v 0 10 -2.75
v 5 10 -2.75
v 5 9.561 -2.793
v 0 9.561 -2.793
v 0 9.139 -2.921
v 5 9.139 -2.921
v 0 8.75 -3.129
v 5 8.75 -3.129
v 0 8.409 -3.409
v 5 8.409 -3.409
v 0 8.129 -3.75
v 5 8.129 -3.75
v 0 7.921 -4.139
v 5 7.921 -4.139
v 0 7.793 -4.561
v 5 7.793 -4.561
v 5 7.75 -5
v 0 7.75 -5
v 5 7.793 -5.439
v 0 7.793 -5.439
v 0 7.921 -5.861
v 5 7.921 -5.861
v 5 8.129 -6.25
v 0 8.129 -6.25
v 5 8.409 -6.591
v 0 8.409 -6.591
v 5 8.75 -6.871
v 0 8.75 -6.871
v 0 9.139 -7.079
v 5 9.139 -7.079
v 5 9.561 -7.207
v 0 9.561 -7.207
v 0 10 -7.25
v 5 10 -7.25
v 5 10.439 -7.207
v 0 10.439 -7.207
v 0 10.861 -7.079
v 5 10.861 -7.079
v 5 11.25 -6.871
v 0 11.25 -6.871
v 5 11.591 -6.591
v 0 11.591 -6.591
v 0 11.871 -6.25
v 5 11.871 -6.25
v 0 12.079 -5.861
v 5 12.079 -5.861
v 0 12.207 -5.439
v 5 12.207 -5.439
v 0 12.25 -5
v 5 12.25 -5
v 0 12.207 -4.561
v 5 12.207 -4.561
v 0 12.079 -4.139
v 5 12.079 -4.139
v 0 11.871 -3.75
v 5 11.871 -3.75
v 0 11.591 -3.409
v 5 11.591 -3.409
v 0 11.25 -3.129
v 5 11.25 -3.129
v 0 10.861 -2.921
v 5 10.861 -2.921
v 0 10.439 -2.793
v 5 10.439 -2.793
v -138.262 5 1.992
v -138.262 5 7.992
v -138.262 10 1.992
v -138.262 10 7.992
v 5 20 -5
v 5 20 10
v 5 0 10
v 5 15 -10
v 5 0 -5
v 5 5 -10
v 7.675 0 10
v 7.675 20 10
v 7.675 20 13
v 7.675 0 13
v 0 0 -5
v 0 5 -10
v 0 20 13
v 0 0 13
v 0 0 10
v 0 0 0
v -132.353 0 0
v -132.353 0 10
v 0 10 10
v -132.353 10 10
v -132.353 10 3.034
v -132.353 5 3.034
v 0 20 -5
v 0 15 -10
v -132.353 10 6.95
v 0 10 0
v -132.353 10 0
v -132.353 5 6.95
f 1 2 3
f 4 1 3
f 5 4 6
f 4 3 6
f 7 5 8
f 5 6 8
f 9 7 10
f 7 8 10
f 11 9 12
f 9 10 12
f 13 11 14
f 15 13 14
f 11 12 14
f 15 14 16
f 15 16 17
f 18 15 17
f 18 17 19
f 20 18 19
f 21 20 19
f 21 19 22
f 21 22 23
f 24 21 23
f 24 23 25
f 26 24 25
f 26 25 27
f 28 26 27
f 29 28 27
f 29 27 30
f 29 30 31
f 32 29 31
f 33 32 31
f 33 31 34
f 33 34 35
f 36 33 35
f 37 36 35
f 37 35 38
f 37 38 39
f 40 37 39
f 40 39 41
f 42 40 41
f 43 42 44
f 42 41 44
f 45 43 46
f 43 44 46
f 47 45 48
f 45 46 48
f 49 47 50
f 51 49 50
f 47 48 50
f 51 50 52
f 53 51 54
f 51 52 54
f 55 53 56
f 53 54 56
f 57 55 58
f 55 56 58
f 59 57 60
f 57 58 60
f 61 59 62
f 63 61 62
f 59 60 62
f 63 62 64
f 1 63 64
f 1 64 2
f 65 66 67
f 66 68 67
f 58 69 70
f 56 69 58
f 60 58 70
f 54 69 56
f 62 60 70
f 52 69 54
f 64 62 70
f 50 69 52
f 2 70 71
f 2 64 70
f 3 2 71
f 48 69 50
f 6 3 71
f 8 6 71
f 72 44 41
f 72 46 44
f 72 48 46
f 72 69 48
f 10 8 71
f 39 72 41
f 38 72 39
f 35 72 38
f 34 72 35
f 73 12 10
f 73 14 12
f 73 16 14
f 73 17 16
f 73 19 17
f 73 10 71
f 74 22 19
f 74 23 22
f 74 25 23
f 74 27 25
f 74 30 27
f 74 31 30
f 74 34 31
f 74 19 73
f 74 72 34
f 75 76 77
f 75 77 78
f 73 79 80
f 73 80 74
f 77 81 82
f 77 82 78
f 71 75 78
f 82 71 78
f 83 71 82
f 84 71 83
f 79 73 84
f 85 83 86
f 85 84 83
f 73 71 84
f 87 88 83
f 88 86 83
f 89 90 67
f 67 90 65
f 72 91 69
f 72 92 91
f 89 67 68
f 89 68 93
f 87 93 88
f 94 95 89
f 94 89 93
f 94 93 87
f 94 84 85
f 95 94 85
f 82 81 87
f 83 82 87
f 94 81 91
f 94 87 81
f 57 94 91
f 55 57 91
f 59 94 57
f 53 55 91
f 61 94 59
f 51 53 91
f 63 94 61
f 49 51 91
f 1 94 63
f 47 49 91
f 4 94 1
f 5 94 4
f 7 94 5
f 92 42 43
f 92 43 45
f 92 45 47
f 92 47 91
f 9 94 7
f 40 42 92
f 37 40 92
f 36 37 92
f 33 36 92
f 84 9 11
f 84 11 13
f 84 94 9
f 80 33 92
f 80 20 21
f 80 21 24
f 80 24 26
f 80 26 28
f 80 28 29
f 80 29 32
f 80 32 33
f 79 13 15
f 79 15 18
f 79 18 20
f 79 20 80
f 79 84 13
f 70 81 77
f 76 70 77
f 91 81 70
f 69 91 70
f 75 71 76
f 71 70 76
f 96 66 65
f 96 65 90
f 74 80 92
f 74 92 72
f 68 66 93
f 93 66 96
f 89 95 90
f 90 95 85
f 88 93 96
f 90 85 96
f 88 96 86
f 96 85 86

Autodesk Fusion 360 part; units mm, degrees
sketch "Sketch1" plane through (0, 0, 0) normal (0, 1, 0) x (1, 0, 0)
  line L0 (0, 0) -> (-25, 0)
  line L1 (-25, 0) -> (-25, -5)
  line L2 (-25, -5) -> (5, -5)
  line L3 (0, 0) -> (0, 10)
  line L4 (0, 10) -> (5, 10)
  line L5 (5, 10) -> (5, -5)
  line L6 (-25, 0) -> (-245, 0)
  line L7 (-245, 0) -> (-245, -5)
  line L8 (-245, -5) -> (-25, -5)
  line L9 (-25, 0) -> (-140, 0)
  line L10 (-140, 0) -> (-140, 27.0089)
  line L11 (-270, 10) -> (-275, 10)
  line L12 (-270, 0) -> (-270, 10)
  line L13 (-275, 10) -> (-275, -5)
  line L14 (-270, 0) -> (-245, 0)
  line L15 (-245, -5) -> (-275, -5)
  line L16 (-245, 0) -> (-245, -5)
  point P0 (-270, 0)
  dimension "d1" = 25
  dimension "d2" = 5
  dimension "d3" = 30
  dimension "d4" = 10
  dimension "d5" = 5
  dimension "d6" = 220
  dimension "d7" = 5
  dimension "d8" = 115
extrude "Extrude1" add sketch "Sketch1" along normal blind 10
extrude "Extrude2" add sketch "Sketch1" along normal blind 20 contours L0 L1 L2 L3 L4 L5 | L7 L11 L12 L13 L14 L15 L16
sketch "Sketch2" plane through (5, 0, 0) normal (1, 0, 0) x (0, 0, -1)
  line L0 (-5, 0) -> (10, 0)
  line L1 (10, 0) -> (10, 20)
  line L2 (10, 20) -> (-5, 20)
  line L3 (-5, 20) -> (-5, 0)
sketch "Sketch3" plane through (0, 0, 0) normal (-1, 0, 0) x (0, 0, 1)
  line L0 (-10, 0) -> (0, 0)
  line L1 (0, 0) -> (0, 20)
  line L2 (0, 20) -> (-10, 20)
  line L3 (-10, 20) -> (-10, 0)
  line L4 (-10, 0) -> (-5, 0)
  line L5 (-5, 0) -> (-5, 10)
  circle A0 centre (-5, 10) radius 2.25
  dimension "d13" = 5
  dimension "d14" = 10
  dimension "d15" = 4.5
extrude "Extrude3" cut sketch "Sketch3" along normal mid plane 662 contours A0
chamfer "Chamfer1" distance 5 angle 45 4 edges at (2.5, 20, -10) (2.5, 0, -10) (-272.5, 20, -10) (-272.5, 0, -10)
sketch "Sketch5" plane through (0, 10, 0) normal (0, 1, 0) x (-1, 0, 0)
  line L0 (25, 5) -> (25, 0)
  line L1 (25, 0) -> (245, 0)
  line L2 (245, 0) -> (245, 5)
  line L3 (245, 5) -> (25, 5)
  line L4 (245, 0) -> (135, 0)
  dimension "d30" = 110
sketch "Sketch6" plane through (0, 0, 5) normal (0, 0, 1) x (1, 0, 0)
  line L0 (-25, 10) -> (-245, 10)
  line L1 (-245, 10) -> (-245, 20)
  line L2 (-245, 20) -> (-275, 20)
  line L3 (-275, 20) -> (-275, 0)
  line L4 (-275, 0) -> (5, 0)
  line L5 (5, 0) -> (5, 20)
  line L6 (5, 20) -> (-25, 20)
  line L7 (-25, 20) -> (-25, 10)
extrude "Extrude5" add 1 faces at (-265, 10, 5) along direction (0, 0, 1) blind 5
sketch "Sketch7" plane through (0, 10, 0) normal (0, 1, 0) x (-1, 0, 0)
  line L0 (25, 10) -> (25, 0)
  line L1 (25, 0) -> (245, 0)
  line L2 (245, 0) -> (245, 10)
  line L3 (245, 10) -> (25, 10)
  line L4 (245, 0) -> (135, 0)
  line L5 (138.2622, 1.9923) -> (132.3533, 3.0342)
  line L6 (138.2622, 7.9923) -> (132.3533, 6.9504)
  line L7 (132.3533, 3.0342) -> (132.3533, 0)
  line L8 (138.2622, 7.9923) -> (138.2622, 1.9923)
  line L9 (132.3533, 6.9504) -> (132.3533, 10)
  line L10 (138.2622, 1.9923) -> (141.0619, 1.9923) construction
  line L11 (138.2622, 7.9923) -> (141.0619, 7.9923) construction
  line L12 (25, 0) -> (245, 0)
  line L13 (128.521, 0) -> (128.521, 5)
  line L14 (270, -5) -> (275, -5)
  line L15 (275, -5) -> (275, 10)
  line L16 (275, 10) -> (245, 10)
  line L17 (245, 10) -> (245, 0)
  line L18 (245, 0) -> (270, 0)
  line L19 (270, 0) -> (270, -5)
  point P0 (132.1074, 10.0354)
  point P1 (138.2622, 4.9923)
  dimension "d33" = 110
  dimension "d34" = 6
  dimension "d35" = 170
  dimension "d36" = 6
  dimension "d37" = 170
  dimension "d38" = 6
  dimension "d41" = 5
extrude "Extrude6" cut sketch "Sketch7" against normal blind 5 contours L1 L2 L3 L4 L5 L6 L7 L8 L9 L12 L17
sketch "Sketch8" plane through (0, 5, 0) normal (0, 1, 0) x (-1, 0, 0)
  line L0 (138.2622, 7.9923) -> (138.2622, 1.9923)
  line L1 (138.2622, 1.9923) -> (132.3533, 3.0342)
  line L2 (132.3533, 3.0342) -> (132.3533, 0)
  line L3 (132.3533, 0) -> (245, 0)
  line L4 (245, 0) -> (245, 10)
  line L5 (245, 10) -> (132.3533, 10)
  line L6 (132.3533, 10) -> (132.3533, 6.9504)
  line L7 (132.3533, 6.9504) -> (138.2622, 7.9923)
  line L8 (245, 5) -> (25, 5)
  line L9 (270, -5) -> (275, -5)
  line L10 (275, -5) -> (275, 10)
  line L11 (275, 10) -> (245, 10)
  line L12 (245, 10) -> (245, 0)
  line L13 (245, 0) -> (270, 0)
  line L14 (270, 0) -> (270, -5)
  line L15 (275, -10) -> (275, -5)
  line L16 (275, -5) -> (270, -5)
  line L17 (270, -5) -> (270, -10)
  line L18 (270, -10) -> (275, -10)
  line L19 (138.2622, 1.9923) -> (138.2622, 0)
  line L20 (138.2622, 0) -> (132.3533, 0)
  line L21 (132.3533, 3.0342) -> (132.3533, 0)
  line L22 (138.2622, 7.9923) -> (138.2622, 10)
sketch "Sketch9" plane through (0, 20, 0) normal (0, 1, 0) x (-1, 0, 0)
  line L0 (270, -5) -> (275, -5)
  line L1 (275, -5) -> (275, 10)
  line L2 (275, 10) -> (245, 10)
  line L3 (245, 10) -> (245, 0)
  line L4 (245, 0) -> (270, 0)
  line L5 (270, 0) -> (270, -5)
  line L6 (275, -10) -> (275, -5)
  line L7 (275, -5) -> (270, -5)
  line L8 (270, -5) -> (270, -10)
  line L9 (270, -10) -> (275, -10)
  line L10 (138.2622, 7.9923) -> (138.2622, 1.9923)
  line L11 (138.2622, 1.9923) -> (132.3533, 3.0342)
  line L12 (132.3533, 3.0342) -> (132.3533, 0)
  line L13 (132.3533, 0) -> (245, 0)
  line L14 (245, 0) -> (245, 10)
  line L15 (245, 10) -> (132.3533, 10)
  line L16 (132.3533, 10) -> (132.3533, 6.9504)
  line L17 (132.3533, 6.9504) -> (138.2622, 7.9923)
  line L18 (138.2622, 1.9923) -> (138.2622, -2.244)
  line L19 (138.2622, -2.244) -> (138.2622, 11)
extrude "Extrude7" cut sketch "Sketch9" against normal blind 40 contours L0 L1 L2 L3 L4 L5 L7 L14 | L0 L6 L7 L8 L9 | L3 L10 L13 L14 L15 L18 L19
sketch "Sketch10" plane through (0, 10, 0) normal (0, 1, 0) x (-1, 0, 0)
  line L0 (132.3533, 0) -> (132.3533, 3.0342)
  line L1 (132.3533, 3.0342) -> (138.2622, 1.9923)
  line L2 (138.2622, 1.9923) -> (138.2622, 7.9923)
  line L3 (138.2622, 7.9923) -> (132.3533, 6.9504)
  line L4 (132.3533, 6.9504) -> (132.3533, 10)
  line L5 (132.3533, 10) -> (25, 10)
  line L6 (25, 10) -> (25, 0)
  line L7 (25, 0) -> (132.3533, 0)
sketch "Sketch11" plane through (0, 0, 0) normal (0, -1, 0) x (1, 0, 0)
  line L0 (-138.2622, 10) -> (-138.2622, 0)
  line L1 (-138.2622, 0) -> (0, 0)
  line L2 (0, 0) -> (0, -5)
  line L3 (0, -5) -> (5, -5)
  line L4 (5, -5) -> (5, 10)
  line L5 (5, 10) -> (-138.2622, 10)
  line L6 (-132.3533, 0) -> (-132.3533, 3.0342)
  line L7 (-132.3533, 3.0342) -> (-138.2622, 1.9923)
  line L8 (-138.2622, 1.9923) -> (-138.2622, 7.9923)
  line L9 (-138.2622, 7.9923) -> (-132.3533, 6.9504)
  line L10 (-132.3533, 6.9504) -> (-132.3533, 10)
  line L11 (-132.3533, 10) -> (-25, 10)
  line L12 (-25, 10) -> (-25, 0)
  line L13 (-25, 0) -> (-132.3533, 0)
  line L14 (-138.2622, 7.9923) -> (-138.2622, 10)
  line L15 (-132.3533, 10) -> (-132.3533, 0)
  line L16 (-138.2622, 0) -> (-138.2622, 1.9923)
  line L17 (-138.2622, 0) -> (-132.3533, 0)
extrude "Extrude8" cut sketch "Sketch11" against normal blind 10 contours L0 L5 L9 L10 L14 L15
extrude "Extrude9" cut sketch "Sketch11" against normal blind 9 contours L0 L1 L6 L7 L15 L16 L17
extrude "Extrude10" cut sketch "Sketch11" against normal blind 5 contours L0 L7 L8 L9 L15
sketch "Sketch12" plane through (0, 20, 0) normal (0, 1, 0) x (-1, 0, 0)
  line L0 (-5, -5) -> (0, -5)
  line L1 (0, -5) -> (0, 0)
  line L2 (0, 0) -> (25, 0)
  line L3 (25, 0) -> (25, 10)
  line L4 (25, 10) -> (-5, 10)
  line L5 (-5, 10) -> (-5, -5)
  line L6 (0, 0) -> (25, 0)
  line L7 (25, 0) -> (25, 10)
  line L8 (25, 10) -> (0, 10)
  line L9 (0, 10) -> (0, 0)
extrude "Extrude11" cut sketch "Sketch12" against normal blind 10 contours L2 L3 L4 L6 L7 L8 L9
sketch "Sketch13" plane through (0, 0, 10) normal (0, 0, 1) x (1, 0, 0)
  line L0 (0, 10) -> (-132.3533, 10)
  line L1 (-132.3533, 10) -> (-132.3533, 0)
  line L2 (-132.3533, 0) -> (5, 0)
  line L3 (5, 0) -> (5, 20)
  line L4 (5, 20) -> (0, 20)
  line L5 (0, 20) -> (0, 10)
  line L6 (0, 0) -> (8.175, 0)
  line L7 (0, 20) -> (0, 0)
  line L8 (0, 20) -> (8.175, 20)
  line L9 (8.175, 20) -> (8.175, 0)
  dimension "d56" = 8.175
extrude "Extrude12" add sketch "Sketch13" along normal blind 3 contours L2 L3 L4 L5 L6 L7 L8 | L3 L6 L8 L9
extrude "Extrude13" cut 1 faces at (8.175, 13.3333, 11) along direction (-1, 0, 0) blind 0.5
equation "d56 = 5 mm + ( 25.4 / 8 ) * 1 mm"
